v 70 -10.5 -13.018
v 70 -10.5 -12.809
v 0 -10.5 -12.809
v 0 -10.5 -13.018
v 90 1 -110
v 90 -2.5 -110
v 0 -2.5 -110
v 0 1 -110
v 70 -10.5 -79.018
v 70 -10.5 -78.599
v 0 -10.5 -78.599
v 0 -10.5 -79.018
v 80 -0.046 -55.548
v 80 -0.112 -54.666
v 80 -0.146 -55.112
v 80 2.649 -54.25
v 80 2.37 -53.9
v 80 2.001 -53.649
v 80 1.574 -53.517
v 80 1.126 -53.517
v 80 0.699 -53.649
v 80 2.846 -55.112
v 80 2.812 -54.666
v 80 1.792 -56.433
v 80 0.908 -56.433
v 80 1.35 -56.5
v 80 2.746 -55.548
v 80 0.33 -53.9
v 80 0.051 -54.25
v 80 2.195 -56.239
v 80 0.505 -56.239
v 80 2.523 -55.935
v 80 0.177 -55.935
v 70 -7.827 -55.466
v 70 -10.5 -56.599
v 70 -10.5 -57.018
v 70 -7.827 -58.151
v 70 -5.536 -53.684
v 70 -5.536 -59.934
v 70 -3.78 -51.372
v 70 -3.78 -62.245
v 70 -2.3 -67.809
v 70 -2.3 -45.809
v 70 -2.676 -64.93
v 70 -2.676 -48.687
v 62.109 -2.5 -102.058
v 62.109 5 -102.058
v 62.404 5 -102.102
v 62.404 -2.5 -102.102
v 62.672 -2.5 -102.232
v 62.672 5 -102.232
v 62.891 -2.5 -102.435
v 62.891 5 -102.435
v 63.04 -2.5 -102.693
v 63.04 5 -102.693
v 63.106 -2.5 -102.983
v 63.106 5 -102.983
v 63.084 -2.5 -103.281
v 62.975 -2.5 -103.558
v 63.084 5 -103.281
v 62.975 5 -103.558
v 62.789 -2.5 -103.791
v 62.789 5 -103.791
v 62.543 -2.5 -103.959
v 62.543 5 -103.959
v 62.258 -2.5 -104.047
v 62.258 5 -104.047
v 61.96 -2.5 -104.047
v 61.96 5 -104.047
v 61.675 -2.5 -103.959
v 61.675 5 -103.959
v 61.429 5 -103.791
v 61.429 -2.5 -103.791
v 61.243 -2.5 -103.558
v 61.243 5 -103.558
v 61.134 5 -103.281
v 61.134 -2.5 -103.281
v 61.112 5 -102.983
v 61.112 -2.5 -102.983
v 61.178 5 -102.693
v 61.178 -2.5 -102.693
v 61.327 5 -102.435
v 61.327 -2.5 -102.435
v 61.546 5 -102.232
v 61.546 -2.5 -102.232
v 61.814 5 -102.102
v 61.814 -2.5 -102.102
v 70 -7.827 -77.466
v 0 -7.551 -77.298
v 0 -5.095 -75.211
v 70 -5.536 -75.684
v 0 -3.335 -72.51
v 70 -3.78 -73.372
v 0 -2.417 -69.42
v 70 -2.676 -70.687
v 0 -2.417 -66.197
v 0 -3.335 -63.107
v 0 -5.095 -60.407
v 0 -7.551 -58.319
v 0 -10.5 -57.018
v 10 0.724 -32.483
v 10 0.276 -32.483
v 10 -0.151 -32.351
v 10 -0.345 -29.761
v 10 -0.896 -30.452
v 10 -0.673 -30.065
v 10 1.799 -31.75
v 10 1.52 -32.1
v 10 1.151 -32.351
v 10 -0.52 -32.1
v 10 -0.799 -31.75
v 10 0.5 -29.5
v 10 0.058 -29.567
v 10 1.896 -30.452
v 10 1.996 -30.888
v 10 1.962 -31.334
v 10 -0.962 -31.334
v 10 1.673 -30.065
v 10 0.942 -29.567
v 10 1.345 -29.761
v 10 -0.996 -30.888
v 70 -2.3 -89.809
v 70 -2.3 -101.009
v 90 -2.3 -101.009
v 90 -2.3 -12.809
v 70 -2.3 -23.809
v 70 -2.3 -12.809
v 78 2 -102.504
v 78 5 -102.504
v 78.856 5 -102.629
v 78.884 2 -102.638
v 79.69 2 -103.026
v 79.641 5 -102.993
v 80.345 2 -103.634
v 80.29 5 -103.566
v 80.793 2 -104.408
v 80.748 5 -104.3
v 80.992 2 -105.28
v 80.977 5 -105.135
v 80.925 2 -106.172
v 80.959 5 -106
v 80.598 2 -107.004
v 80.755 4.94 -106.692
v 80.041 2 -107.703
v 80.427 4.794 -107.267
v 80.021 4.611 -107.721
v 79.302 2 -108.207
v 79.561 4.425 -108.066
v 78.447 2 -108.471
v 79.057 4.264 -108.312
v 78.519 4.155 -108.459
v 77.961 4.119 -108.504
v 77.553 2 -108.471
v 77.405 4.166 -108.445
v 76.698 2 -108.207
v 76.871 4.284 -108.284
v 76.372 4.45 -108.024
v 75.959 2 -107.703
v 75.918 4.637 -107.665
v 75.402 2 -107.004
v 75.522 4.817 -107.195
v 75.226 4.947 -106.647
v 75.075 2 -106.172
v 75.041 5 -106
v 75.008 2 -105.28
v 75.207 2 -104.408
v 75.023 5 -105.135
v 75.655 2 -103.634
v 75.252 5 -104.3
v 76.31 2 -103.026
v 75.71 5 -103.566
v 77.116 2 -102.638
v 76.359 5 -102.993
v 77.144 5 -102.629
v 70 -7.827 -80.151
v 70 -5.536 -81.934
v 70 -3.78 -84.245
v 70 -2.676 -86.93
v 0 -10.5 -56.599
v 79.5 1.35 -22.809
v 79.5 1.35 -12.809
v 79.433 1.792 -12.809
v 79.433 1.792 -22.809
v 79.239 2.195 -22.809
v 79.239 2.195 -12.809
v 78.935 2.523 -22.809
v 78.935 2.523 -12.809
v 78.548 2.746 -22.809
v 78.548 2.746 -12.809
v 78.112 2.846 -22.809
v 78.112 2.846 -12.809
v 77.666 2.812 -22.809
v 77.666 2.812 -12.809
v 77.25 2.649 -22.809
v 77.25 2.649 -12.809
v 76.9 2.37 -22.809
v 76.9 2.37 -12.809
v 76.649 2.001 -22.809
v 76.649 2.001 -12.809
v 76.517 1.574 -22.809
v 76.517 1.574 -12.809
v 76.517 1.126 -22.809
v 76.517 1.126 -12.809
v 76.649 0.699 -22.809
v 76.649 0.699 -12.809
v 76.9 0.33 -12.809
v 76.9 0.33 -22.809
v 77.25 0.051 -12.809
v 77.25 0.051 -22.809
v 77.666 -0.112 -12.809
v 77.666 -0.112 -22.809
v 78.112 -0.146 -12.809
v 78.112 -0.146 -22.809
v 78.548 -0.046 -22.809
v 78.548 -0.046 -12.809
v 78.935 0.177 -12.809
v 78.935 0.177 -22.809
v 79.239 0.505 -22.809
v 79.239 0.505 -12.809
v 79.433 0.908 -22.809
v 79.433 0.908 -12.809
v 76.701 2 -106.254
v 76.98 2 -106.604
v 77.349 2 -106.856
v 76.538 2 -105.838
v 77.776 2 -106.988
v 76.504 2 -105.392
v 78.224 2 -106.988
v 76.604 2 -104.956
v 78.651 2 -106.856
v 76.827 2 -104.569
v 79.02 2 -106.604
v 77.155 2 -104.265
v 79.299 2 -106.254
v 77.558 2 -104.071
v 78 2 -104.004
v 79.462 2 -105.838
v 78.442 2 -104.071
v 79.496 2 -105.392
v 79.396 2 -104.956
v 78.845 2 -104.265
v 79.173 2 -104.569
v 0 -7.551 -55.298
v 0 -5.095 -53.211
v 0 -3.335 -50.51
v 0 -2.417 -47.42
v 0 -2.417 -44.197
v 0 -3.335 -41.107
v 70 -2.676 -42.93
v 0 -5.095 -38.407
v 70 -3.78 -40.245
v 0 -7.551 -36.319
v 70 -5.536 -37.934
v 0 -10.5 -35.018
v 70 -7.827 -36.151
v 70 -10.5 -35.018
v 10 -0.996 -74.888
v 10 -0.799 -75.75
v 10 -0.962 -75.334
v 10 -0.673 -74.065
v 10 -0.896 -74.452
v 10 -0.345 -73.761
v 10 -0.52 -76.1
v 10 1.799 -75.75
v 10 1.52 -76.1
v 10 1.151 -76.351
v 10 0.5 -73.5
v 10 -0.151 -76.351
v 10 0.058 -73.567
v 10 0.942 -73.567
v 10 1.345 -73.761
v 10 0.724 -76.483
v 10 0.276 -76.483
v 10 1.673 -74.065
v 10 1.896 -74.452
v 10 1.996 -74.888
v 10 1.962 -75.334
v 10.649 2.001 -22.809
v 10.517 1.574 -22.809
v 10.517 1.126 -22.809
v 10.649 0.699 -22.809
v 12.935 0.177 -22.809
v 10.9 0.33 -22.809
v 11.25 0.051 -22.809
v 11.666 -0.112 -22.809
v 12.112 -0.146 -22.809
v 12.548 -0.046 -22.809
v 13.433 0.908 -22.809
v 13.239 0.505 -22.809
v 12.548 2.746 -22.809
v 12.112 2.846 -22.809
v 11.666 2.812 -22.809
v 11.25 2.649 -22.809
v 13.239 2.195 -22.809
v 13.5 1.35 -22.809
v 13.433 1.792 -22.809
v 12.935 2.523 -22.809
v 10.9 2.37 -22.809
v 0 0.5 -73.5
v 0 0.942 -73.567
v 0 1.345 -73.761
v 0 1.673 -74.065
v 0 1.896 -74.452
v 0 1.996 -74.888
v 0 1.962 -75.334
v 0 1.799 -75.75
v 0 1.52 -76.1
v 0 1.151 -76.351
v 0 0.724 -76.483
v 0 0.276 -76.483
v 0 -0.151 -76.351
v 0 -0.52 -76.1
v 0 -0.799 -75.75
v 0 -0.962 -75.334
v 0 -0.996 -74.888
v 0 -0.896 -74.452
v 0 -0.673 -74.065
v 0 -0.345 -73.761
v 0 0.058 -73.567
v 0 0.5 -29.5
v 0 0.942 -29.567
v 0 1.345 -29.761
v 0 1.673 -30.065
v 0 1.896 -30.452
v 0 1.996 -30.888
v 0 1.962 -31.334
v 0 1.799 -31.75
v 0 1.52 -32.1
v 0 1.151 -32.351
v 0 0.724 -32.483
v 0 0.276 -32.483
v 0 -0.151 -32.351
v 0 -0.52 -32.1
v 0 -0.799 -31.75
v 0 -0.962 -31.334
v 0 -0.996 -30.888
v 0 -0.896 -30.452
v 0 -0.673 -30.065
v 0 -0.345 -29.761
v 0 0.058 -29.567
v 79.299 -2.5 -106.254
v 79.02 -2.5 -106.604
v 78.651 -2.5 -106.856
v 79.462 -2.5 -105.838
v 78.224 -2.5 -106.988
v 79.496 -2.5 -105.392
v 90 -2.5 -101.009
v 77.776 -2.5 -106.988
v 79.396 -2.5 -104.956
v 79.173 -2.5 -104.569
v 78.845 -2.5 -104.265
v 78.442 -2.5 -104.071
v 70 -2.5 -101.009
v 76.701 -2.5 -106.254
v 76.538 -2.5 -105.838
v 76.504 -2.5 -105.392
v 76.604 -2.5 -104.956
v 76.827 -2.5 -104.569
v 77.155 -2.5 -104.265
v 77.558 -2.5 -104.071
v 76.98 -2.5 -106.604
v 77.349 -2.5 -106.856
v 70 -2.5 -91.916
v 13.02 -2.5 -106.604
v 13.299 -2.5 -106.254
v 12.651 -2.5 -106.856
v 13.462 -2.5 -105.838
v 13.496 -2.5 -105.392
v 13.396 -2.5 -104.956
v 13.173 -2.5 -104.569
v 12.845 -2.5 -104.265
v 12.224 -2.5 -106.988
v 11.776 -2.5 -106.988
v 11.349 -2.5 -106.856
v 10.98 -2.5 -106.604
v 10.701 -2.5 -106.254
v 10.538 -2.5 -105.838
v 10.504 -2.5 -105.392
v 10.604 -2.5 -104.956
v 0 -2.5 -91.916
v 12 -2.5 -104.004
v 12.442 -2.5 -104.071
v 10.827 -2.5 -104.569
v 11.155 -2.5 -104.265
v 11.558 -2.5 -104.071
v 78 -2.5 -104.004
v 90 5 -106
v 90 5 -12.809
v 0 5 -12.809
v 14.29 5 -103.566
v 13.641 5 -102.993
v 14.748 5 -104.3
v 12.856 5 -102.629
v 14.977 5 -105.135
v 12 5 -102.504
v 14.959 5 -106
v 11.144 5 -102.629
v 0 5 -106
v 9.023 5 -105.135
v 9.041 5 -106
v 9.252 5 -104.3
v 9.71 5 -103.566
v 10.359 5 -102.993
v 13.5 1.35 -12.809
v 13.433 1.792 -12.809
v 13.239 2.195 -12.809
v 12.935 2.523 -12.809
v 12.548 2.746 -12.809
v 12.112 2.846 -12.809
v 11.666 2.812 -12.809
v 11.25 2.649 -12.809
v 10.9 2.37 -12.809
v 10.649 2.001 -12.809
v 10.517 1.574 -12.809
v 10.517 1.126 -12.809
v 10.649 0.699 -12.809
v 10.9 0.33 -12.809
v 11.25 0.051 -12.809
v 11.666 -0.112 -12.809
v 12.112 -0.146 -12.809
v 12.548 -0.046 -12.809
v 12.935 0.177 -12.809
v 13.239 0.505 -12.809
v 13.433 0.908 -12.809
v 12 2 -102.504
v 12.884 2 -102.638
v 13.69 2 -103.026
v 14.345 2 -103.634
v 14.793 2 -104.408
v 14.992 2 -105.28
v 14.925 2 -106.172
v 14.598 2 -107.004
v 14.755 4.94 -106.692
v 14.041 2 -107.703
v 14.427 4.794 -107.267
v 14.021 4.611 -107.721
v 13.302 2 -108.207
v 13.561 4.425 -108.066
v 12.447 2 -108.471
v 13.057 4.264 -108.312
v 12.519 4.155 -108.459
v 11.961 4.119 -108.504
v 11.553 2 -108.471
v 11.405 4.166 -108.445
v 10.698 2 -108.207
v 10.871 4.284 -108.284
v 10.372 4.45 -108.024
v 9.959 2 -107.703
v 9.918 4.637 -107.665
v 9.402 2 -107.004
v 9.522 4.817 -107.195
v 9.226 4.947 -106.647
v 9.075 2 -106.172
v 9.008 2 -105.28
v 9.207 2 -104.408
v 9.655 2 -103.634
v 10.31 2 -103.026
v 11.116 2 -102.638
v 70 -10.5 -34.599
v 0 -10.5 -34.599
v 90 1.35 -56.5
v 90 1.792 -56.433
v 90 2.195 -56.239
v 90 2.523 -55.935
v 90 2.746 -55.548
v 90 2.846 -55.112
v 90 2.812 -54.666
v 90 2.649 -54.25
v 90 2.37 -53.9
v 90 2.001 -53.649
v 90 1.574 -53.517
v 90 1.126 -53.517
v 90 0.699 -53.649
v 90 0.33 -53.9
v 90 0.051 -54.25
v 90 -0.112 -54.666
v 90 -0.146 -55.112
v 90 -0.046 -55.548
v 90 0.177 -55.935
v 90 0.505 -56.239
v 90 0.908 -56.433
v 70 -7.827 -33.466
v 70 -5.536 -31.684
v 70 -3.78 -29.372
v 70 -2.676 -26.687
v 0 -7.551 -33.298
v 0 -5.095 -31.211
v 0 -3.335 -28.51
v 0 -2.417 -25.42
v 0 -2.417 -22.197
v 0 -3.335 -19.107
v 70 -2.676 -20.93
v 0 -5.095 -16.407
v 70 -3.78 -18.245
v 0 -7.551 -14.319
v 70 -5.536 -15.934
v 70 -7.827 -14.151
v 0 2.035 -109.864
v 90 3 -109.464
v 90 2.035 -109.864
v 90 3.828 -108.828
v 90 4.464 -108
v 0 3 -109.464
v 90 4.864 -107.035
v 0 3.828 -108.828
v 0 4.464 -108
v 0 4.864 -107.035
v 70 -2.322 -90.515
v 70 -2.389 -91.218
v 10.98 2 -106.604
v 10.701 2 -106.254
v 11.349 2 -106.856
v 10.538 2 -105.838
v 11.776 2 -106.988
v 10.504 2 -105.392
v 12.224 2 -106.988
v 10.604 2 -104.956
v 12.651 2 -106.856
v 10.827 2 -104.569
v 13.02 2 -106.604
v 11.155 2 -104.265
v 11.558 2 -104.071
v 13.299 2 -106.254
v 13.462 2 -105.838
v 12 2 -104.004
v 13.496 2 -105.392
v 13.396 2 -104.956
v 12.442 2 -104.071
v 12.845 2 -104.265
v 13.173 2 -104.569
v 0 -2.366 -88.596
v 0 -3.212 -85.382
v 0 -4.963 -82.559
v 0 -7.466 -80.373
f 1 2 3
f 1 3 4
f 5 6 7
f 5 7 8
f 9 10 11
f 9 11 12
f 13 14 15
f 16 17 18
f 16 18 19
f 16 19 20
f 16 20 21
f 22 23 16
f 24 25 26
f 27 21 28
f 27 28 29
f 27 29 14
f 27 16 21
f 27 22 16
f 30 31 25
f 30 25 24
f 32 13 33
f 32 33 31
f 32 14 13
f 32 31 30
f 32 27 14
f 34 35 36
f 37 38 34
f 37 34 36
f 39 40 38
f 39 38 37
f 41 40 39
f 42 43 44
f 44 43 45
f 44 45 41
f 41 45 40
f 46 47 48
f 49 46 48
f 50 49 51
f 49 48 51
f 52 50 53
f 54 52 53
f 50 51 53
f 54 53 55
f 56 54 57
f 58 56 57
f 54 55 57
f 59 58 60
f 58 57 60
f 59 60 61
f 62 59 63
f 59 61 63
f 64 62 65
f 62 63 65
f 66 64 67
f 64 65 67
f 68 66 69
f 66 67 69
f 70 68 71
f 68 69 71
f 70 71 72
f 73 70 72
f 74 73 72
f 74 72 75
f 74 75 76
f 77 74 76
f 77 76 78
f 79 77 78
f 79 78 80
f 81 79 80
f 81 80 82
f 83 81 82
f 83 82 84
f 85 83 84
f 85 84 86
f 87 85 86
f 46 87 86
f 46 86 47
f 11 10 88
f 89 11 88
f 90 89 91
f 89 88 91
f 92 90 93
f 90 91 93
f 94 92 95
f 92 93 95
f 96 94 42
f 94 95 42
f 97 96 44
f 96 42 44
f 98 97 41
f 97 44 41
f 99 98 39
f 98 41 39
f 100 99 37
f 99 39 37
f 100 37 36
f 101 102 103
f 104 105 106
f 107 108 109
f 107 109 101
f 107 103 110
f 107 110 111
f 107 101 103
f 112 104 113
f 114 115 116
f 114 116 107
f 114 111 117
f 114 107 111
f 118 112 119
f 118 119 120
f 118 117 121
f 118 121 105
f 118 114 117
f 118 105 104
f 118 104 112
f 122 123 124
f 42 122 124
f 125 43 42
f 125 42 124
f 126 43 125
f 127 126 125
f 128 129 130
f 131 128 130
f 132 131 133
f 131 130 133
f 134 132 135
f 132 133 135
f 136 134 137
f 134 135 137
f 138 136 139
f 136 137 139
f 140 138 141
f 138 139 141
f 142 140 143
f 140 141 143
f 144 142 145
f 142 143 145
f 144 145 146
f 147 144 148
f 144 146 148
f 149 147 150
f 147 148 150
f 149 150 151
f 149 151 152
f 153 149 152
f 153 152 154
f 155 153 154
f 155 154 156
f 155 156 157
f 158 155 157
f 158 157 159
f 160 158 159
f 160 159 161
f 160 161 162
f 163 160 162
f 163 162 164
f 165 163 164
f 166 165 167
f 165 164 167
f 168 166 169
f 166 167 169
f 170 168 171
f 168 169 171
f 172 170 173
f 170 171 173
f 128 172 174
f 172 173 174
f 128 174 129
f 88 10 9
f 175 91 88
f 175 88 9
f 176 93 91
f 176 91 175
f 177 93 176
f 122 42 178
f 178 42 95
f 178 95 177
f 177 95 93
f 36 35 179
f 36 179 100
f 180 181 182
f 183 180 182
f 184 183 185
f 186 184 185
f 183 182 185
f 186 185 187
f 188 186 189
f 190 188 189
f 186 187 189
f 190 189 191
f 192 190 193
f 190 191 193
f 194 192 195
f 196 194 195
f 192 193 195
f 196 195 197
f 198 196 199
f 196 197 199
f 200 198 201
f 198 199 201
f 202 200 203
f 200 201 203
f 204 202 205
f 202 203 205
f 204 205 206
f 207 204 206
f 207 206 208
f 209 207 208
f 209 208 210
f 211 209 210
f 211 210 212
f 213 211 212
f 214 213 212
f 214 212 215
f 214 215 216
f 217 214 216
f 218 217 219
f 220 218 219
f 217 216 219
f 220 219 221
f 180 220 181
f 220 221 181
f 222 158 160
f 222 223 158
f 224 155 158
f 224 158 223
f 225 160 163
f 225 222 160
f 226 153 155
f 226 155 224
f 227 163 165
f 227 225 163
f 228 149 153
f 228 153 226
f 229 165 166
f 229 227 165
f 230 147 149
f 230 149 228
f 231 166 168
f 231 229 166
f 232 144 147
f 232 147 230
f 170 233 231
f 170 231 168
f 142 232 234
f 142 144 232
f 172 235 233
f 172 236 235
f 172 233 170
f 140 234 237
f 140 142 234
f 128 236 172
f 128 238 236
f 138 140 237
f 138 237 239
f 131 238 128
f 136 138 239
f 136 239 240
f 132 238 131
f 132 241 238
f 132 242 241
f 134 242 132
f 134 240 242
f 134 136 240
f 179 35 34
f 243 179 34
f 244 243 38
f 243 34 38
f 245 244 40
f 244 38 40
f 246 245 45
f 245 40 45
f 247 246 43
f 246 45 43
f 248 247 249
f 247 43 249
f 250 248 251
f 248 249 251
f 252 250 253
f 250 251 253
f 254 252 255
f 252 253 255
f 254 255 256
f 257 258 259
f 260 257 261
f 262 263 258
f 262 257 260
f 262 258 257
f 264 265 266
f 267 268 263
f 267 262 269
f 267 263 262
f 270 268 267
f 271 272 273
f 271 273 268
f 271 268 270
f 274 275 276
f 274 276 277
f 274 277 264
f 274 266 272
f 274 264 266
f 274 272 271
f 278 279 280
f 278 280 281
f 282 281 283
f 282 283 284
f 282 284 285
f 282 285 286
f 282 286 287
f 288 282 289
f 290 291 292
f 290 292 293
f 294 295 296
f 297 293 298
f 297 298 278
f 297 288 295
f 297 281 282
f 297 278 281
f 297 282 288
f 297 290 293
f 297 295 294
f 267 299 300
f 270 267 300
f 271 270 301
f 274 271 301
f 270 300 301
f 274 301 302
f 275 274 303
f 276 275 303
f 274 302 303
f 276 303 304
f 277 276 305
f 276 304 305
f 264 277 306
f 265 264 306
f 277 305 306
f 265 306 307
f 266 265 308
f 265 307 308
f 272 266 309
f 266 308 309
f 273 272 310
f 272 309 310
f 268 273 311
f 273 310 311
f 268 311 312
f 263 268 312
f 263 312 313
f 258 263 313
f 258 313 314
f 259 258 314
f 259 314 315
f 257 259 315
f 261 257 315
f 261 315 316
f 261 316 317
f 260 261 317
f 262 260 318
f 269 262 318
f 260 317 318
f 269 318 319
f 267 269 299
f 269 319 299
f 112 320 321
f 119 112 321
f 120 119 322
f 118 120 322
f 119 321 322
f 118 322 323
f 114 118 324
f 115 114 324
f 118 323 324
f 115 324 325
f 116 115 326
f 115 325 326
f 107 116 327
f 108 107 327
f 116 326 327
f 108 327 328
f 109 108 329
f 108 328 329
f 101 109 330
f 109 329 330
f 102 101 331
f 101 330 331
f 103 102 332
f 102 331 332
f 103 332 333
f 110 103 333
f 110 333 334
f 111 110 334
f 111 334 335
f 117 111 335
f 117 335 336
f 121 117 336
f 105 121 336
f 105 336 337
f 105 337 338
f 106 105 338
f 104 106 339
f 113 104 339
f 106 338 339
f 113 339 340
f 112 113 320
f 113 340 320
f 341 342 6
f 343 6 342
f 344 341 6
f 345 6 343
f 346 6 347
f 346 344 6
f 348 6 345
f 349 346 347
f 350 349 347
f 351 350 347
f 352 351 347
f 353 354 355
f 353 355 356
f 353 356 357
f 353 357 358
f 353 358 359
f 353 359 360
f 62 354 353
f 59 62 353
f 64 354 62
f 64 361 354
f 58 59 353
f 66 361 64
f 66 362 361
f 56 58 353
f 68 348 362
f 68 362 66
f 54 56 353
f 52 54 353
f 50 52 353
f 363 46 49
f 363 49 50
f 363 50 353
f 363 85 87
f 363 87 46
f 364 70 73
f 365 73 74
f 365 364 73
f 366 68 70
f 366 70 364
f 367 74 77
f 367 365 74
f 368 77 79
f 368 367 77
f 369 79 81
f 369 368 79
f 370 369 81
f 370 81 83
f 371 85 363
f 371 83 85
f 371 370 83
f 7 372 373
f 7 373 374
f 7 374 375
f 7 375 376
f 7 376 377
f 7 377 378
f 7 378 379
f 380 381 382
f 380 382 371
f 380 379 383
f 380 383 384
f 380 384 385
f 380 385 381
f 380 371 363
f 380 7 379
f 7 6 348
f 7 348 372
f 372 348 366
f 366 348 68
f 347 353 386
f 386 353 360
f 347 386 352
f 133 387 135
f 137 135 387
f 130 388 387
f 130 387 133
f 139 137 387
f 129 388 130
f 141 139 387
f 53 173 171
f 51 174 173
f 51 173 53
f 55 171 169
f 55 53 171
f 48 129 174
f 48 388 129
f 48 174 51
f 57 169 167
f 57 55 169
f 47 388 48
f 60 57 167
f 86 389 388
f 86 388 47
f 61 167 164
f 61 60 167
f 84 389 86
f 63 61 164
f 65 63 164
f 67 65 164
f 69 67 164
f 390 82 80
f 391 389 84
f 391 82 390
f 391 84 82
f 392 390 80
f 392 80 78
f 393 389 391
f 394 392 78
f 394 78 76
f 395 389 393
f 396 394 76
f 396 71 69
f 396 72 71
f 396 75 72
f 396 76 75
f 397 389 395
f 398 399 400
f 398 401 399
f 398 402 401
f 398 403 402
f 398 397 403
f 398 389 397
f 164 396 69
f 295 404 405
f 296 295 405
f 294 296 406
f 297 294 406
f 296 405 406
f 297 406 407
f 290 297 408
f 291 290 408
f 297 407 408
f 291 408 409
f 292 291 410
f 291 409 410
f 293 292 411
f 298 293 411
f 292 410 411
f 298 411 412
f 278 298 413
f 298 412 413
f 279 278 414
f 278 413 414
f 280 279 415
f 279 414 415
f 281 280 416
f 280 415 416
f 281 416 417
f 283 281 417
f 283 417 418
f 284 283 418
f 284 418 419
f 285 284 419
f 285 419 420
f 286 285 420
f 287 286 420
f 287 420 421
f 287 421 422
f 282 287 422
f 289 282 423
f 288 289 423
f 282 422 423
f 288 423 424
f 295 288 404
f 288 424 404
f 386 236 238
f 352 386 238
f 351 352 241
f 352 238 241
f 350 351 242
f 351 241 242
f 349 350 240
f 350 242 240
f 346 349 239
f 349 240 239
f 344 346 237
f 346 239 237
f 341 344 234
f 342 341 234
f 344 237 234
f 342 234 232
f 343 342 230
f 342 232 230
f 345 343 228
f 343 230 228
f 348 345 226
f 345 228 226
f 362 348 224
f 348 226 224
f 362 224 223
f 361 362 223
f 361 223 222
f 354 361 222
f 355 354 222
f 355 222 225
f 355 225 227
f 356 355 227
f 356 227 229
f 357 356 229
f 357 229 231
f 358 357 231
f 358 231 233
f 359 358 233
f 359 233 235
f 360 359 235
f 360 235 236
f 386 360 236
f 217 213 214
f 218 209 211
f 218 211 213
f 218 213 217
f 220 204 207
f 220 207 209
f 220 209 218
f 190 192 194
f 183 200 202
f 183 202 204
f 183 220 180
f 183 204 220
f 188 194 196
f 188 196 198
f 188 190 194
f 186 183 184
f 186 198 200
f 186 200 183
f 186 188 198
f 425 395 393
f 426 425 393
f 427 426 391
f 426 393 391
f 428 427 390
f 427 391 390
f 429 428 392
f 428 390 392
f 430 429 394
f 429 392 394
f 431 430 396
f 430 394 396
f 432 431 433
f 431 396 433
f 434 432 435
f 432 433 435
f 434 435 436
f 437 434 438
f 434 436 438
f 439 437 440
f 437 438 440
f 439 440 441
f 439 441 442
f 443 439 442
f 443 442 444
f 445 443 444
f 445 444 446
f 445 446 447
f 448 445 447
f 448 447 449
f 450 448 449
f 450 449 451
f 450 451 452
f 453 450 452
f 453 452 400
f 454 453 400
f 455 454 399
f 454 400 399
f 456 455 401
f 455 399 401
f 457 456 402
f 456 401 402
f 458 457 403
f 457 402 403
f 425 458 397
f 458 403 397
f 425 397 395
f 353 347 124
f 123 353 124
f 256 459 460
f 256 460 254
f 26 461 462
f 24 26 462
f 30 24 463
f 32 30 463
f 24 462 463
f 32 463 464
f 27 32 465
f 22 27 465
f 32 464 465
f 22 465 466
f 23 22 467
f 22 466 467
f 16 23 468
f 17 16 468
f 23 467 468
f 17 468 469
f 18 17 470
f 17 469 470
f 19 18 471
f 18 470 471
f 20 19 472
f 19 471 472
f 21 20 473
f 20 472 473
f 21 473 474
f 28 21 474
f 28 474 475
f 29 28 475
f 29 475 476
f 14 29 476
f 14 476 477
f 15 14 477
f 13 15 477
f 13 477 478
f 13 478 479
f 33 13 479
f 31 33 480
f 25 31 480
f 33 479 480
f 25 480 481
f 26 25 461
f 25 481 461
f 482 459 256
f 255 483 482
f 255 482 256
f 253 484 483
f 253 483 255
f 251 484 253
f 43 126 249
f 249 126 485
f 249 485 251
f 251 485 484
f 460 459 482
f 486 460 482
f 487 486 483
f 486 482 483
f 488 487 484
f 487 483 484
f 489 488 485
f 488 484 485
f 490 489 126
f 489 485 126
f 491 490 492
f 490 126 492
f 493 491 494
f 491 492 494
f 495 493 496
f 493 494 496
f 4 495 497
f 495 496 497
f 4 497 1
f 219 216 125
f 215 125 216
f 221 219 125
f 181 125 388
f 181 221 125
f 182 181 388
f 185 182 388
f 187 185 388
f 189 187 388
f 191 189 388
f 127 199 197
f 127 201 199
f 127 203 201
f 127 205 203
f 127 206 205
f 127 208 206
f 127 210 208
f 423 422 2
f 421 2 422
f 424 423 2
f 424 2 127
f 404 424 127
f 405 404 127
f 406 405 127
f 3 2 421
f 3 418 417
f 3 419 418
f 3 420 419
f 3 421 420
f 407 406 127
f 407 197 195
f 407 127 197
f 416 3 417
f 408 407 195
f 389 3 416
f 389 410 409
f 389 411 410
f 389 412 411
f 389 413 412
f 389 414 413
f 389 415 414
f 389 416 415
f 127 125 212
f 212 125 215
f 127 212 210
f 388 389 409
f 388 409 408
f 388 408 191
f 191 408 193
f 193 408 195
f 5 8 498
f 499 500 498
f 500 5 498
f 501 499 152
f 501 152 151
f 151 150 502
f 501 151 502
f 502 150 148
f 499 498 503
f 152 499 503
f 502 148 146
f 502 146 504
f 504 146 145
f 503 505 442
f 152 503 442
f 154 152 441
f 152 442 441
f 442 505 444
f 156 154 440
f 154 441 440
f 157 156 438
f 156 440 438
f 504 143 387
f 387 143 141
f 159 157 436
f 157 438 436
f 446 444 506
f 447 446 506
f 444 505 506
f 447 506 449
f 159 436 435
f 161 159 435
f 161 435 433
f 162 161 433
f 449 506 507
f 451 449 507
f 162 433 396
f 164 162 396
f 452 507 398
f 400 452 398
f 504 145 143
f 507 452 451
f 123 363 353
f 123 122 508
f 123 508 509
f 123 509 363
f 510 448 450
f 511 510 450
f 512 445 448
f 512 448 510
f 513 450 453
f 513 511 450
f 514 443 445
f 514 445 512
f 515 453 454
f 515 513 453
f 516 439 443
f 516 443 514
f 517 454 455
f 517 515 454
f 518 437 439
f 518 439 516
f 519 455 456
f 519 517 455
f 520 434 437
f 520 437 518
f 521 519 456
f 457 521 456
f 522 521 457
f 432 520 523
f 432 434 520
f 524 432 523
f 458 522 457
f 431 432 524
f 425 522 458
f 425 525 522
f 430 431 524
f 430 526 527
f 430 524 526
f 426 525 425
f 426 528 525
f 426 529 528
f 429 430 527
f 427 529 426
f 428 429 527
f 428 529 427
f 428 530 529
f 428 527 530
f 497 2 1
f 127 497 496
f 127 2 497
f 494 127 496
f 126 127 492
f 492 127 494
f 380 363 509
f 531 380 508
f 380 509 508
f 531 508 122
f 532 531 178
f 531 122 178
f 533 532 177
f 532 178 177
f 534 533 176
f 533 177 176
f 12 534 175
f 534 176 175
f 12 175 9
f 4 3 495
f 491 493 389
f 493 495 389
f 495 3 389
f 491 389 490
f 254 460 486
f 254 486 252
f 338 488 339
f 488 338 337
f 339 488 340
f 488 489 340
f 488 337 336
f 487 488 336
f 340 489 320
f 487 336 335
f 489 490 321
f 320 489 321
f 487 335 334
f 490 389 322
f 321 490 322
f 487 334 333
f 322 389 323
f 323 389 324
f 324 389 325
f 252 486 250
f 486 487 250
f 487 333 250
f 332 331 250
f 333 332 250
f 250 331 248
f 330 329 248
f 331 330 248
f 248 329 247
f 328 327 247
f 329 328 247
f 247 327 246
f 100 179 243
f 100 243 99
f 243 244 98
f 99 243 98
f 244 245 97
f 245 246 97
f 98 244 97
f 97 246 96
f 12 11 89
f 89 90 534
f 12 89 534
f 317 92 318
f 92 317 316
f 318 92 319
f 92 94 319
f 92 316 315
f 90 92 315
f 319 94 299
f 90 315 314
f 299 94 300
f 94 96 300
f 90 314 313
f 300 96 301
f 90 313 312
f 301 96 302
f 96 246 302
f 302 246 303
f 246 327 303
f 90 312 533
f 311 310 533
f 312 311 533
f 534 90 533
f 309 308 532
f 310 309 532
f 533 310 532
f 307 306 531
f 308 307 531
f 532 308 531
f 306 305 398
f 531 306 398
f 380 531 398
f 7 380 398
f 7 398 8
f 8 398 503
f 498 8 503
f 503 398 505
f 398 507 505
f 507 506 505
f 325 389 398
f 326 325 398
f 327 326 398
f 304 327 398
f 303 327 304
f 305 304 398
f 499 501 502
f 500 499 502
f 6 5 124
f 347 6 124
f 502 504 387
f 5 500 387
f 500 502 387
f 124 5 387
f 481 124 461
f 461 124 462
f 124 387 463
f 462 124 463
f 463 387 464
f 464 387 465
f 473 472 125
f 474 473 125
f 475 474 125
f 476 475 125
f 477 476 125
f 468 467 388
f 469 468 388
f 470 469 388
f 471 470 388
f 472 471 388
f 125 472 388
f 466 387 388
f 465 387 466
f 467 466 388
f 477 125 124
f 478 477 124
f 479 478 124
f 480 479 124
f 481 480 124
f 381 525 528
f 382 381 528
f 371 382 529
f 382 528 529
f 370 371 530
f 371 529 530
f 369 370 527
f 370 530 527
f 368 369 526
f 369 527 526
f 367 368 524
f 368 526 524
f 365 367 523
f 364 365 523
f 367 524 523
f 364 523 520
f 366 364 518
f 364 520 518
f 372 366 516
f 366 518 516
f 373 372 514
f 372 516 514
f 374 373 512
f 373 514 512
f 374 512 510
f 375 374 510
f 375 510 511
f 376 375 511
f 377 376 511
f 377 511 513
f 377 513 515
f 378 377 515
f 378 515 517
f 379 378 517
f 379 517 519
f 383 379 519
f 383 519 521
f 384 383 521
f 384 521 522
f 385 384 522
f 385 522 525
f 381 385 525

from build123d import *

# Parameters (mm, degrees)
SKETCH_1_W          = 70
SKETCH_1_H          = 110
EXTRUDE_1_DEPTH     = 5
EXTRUDE_2_DEPTH     = 70
SKETCH_3_W          = 12.808674266
SKETCH_3_H          = 5
CUT_EXTRUDE_1_DEPTH = 70
CUT_EXTRUDE_2_REACH = 132.806
SKETCH_4_R          = 11.2
EXTRUDE_3_DEPTH     = 20
SKETCH_6_R          = 1.5
CUT_EXTRUDE_3_DEPTH = 10
SKETCH_7_R          = 1.5
CUT_EXTRUDE_4_DEPTH = 10
CUT_EXTRUDE_5_REACH = 144.969
SKETCH_8_R          = 1.5
SKETCH_9_R          = 3
CUT_EXTRUDE_6_DEPTH = 3
CUT_EXTRUDE_7_REACH = 144.969
SKETCH_10_R         = 1
FILLET_1_R          = 4
SKETCH_11_R         = 1.5
CUT_EXTRUDE_8_DEPTH = 10


with BuildPart() as part:
    # 草图1 → 凸台-拉伸1 (new body)
    with BuildSketch(Plane(origin=(0, 0, 0), x_dir=(1, 0, 0), z_dir=(0, 1, 0))):
        with Locations((35, 55)):
            Rectangle(SKETCH_1_W, SKETCH_1_H)
    extrude(amount=EXTRUDE_1_DEPTH)

    # 草图2 → 凸台-拉伸2 (add)
    with BuildSketch(Plane(origin=(70, 0, 0), x_dir=(0, 0, -1), z_dir=(1, 0, 0))):
        with BuildLine():
            Line((12.808674266, 0), (12.808674266, -10.5))
            Line((12.808674266, -10.5), (13.225674113, -10.5))
            ThreePointArc((13.225674113, -10.5), (23.808674266, -2.500017961), (34.391674418, -10.5))
            Line((34.391674418, -10.5), (35.225674113, -10.5))
            ThreePointArc((35.225674113, -10.5), (45.808674266, -2.500017961), (56.391674418, -10.5))
            Line((56.391674418, -10.5), (57.225674113, -10.5))
            ThreePointArc((57.225674113, -10.5), (67.808674266, -2.500017961), (78.391674418, -10.5))
            Line((78.391674418, -10.5), (79.225674113, -10.5))
            ThreePointArc((79.225674113, -10.5), (83.175432131, -4.725047944), (89.808674266, -2.500017961))
            Line((89.808674266, -2.500017961), (110, -2.500017961))
            Line((110, -2.500017961), (110, 0))
            Line((110, 0), (12.808674266, 0))
        make_face()
    extrude(amount=-EXTRUDE_2_DEPTH)

    # 草图3 → 切除-拉伸1 (cut)
    with BuildSketch(Plane(origin=(70, 0, 0), x_dir=(0, 0, -1), z_dir=(1, 0, 0))):
        with Locations((6.404337133, 2.5)):
            Rectangle(SKETCH_3_W, SKETCH_3_H)
    extrude(amount=-CUT_EXTRUDE_1_DEPTH, mode=Mode.SUBTRACT)

    # 草图4 → 切除-拉伸2 (cut, up to next)
    with BuildSketch(Plane(origin=(70, 0, 0), x_dir=(0, 0, -1), z_dir=(1, 0, 0)), mode=Mode.PRIVATE) as cut_extrude_2_sk1:
        with Locations((23.808674266, -13.500017961)):
            Circle(SKETCH_4_R)
    cut_extrude_2_tool1 = extrude(cut_extrude_2_sk1.sketch, amount=-CUT_EXTRUDE_2_REACH, mode=Mode.PRIVATE) & part.part
    # 草图4 → 切除-拉伸2 (cut, up to next)
    with BuildSketch(Plane(origin=(70, 0, 0), x_dir=(0, 0, -1), z_dir=(1, 0, 0)), mode=Mode.PRIVATE) as cut_extrude_2_sk2:
        with Locations((45.808674266, -13.500017961)):
            Circle(SKETCH_4_R)
    cut_extrude_2_tool2 = extrude(cut_extrude_2_sk2.sketch, amount=-CUT_EXTRUDE_2_REACH, mode=Mode.PRIVATE) & part.part
    # 草图4 → 切除-拉伸2 (cut, up to next)
    with BuildSketch(Plane(origin=(70, 0, 0), x_dir=(0, 0, -1), z_dir=(1, 0, 0)), mode=Mode.PRIVATE) as cut_extrude_2_sk3:
        with Locations((67.808674266, -13.500017961)):
            Circle(SKETCH_4_R)
    cut_extrude_2_tool3 = extrude(cut_extrude_2_sk3.sketch, amount=-CUT_EXTRUDE_2_REACH, mode=Mode.PRIVATE) & part.part
    # 草图4 → 切除-拉伸2 (cut, up to next)
    with BuildSketch(Plane(origin=(70, 0, 0), x_dir=(0, 0, -1), z_dir=(1, 0, 0)), mode=Mode.PRIVATE) as cut_extrude_2_sk4:
        with Locations((89.808674266, -13.500017961)):
            Circle(SKETCH_4_R)
    cut_extrude_2_tool4 = extrude(cut_extrude_2_sk4.sketch, amount=-CUT_EXTRUDE_2_REACH, mode=Mode.PRIVATE) & part.part
    add(cut_extrude_2_tool1.solids().sort_by_distance((70, -13.500018, -23.808674))[0], mode=Mode.SUBTRACT)
    add(cut_extrude_2_tool2.solids().sort_by_distance((70, -13.500018, -45.808674))[0], mode=Mode.SUBTRACT)
    add(cut_extrude_2_tool3.solids().sort_by_distance((70, -13.500018, -67.808674))[0], mode=Mode.SUBTRACT)
    add(cut_extrude_2_tool4.solids().sort_by_distance((70, -13.500018, -89.808674))[0], mode=Mode.SUBTRACT)

    # 草图5 → 凸台-拉伸3 (add)
    with BuildSketch(Plane(origin=(70, 0, 0), x_dir=(0, 0, -1), z_dir=(1, 0, 0))):
        Polygon((12.808674266, 5), (110, 5), (110, -2.300017961), (110, -2.500017961), (101.008674266, -2.500017961), (101.008674266, -2.300017961), (12.808674266, -2.300017961), align=None)
    extrude(amount=EXTRUDE_3_DEPTH)

    # 草图6 → 切除-拉伸3 (cut)
    with BuildSketch(Plane.ZY):
        with Locations((-31, 0.5)):
            Circle(SKETCH_6_R)
        with Locations((-75, 0.5)):
            Circle(SKETCH_6_R)
    extrude(amount=-CUT_EXTRUDE_3_DEPTH, mode=Mode.SUBTRACT)

    # 草图7 → 切除-拉伸4 (cut)
    with BuildSketch(Plane.XY.offset(-12.808674266)):
        with Locations((12, 1.34999102)):
            Circle(SKETCH_7_R)
        with Locations((78, 1.34999102)):
            Circle(SKETCH_7_R)
    extrude(amount=-CUT_EXTRUDE_4_DEPTH, mode=Mode.SUBTRACT)

    # 草图8 → 切除-拉伸5 (cut, up to next)
    with BuildSketch(Plane(origin=(0, 5, 0), x_dir=(1, 0, 0), z_dir=(0, 1, 0)), mode=Mode.PRIVATE) as cut_extrude_5_sk1:
        with Locations(Location((78, 105.504337133, 0), (0, 0, 270))):
            Circle(SKETCH_8_R)
    cut_extrude_5_tool1 = extrude(cut_extrude_5_sk1.sketch, amount=-CUT_EXTRUDE_5_REACH, mode=Mode.PRIVATE) & part.part
    # 草图8 → 切除-拉伸5 (cut, up to next)
    with BuildSketch(Plane(origin=(0, 5, 0), x_dir=(1, 0, 0), z_dir=(0, 1, 0)), mode=Mode.PRIVATE) as cut_extrude_5_sk2:
        with Locations(Location((12, 105.504337133, 0), (0, 0, 270))):
            Circle(SKETCH_8_R)
    cut_extrude_5_tool2 = extrude(cut_extrude_5_sk2.sketch, amount=-CUT_EXTRUDE_5_REACH, mode=Mode.PRIVATE) & part.part
    add(cut_extrude_5_tool1.solids().sort_by_distance((78, 5, -105.504337))[0], mode=Mode.SUBTRACT)
    add(cut_extrude_5_tool2.solids().sort_by_distance((12, 5, -105.504337))[0], mode=Mode.SUBTRACT)

    # 草图9 → 切除-拉伸6 (cut)
    with BuildSketch(Plane(origin=(0, 5, 0), x_dir=(1, 0, 0), z_dir=(0, 1, 0))):
        with Locations(Location((78, 105.504337133, 0), (0, 0, 270))):
            Circle(SKETCH_9_R)
        with Locations(Location((12, 105.504337133, 0), (0, 0, 270))):
            Circle(SKETCH_9_R)
    extrude(amount=-CUT_EXTRUDE_6_DEPTH, mode=Mode.SUBTRACT)

    # 草图10 → 切除-拉伸7 (cut, up to next)
    with BuildSketch(Plane(origin=(0, 5, 0), x_dir=(1, 0, 0), z_dir=(0, 1, 0)), mode=Mode.PRIVATE) as cut_extrude_7_sk1:
        with Locations(Location((62.109, 103.058, 0), (0, 0, 270))):
            Circle(SKETCH_10_R)
    cut_extrude_7_tool1 = extrude(cut_extrude_7_sk1.sketch, amount=-CUT_EXTRUDE_7_REACH, mode=Mode.PRIVATE) & part.part
    add(cut_extrude_7_tool1.solids().sort_by_distance((62.109, 5, -103.058))[0], mode=Mode.SUBTRACT)

    # 圆角1
    # the kernel refuses this fillet: 4 mm, written as the material it takes off along each edge
    with BuildSketch(Plane(origin=(-10, 5, -110), x_dir=(0, -1, 0), z_dir=(1, 0, 0))) as fillet_1_piece_1:
        with BuildLine():
            CenterArc((FILLET_1_R, -FILLET_1_R), FILLET_1_R, 90, 90)
            Line((0, -FILLET_1_R), (0, 0))
            Line((0, 0), (FILLET_1_R, 0))
        make_face()
    extrude(amount=110, mode=Mode.SUBTRACT)

    # 草图11 → 切除-拉伸8 (cut)
    with BuildSketch(Plane(origin=(90, 0, 0), x_dir=(0, 0, -1), z_dir=(1, 0, 0))):
        with Locations((55, 1.34999102)):
            Circle(SKETCH_11_R)
    extrude(amount=-CUT_EXTRUDE_8_DEPTH, mode=Mode.SUBTRACT)


solid = part.part
